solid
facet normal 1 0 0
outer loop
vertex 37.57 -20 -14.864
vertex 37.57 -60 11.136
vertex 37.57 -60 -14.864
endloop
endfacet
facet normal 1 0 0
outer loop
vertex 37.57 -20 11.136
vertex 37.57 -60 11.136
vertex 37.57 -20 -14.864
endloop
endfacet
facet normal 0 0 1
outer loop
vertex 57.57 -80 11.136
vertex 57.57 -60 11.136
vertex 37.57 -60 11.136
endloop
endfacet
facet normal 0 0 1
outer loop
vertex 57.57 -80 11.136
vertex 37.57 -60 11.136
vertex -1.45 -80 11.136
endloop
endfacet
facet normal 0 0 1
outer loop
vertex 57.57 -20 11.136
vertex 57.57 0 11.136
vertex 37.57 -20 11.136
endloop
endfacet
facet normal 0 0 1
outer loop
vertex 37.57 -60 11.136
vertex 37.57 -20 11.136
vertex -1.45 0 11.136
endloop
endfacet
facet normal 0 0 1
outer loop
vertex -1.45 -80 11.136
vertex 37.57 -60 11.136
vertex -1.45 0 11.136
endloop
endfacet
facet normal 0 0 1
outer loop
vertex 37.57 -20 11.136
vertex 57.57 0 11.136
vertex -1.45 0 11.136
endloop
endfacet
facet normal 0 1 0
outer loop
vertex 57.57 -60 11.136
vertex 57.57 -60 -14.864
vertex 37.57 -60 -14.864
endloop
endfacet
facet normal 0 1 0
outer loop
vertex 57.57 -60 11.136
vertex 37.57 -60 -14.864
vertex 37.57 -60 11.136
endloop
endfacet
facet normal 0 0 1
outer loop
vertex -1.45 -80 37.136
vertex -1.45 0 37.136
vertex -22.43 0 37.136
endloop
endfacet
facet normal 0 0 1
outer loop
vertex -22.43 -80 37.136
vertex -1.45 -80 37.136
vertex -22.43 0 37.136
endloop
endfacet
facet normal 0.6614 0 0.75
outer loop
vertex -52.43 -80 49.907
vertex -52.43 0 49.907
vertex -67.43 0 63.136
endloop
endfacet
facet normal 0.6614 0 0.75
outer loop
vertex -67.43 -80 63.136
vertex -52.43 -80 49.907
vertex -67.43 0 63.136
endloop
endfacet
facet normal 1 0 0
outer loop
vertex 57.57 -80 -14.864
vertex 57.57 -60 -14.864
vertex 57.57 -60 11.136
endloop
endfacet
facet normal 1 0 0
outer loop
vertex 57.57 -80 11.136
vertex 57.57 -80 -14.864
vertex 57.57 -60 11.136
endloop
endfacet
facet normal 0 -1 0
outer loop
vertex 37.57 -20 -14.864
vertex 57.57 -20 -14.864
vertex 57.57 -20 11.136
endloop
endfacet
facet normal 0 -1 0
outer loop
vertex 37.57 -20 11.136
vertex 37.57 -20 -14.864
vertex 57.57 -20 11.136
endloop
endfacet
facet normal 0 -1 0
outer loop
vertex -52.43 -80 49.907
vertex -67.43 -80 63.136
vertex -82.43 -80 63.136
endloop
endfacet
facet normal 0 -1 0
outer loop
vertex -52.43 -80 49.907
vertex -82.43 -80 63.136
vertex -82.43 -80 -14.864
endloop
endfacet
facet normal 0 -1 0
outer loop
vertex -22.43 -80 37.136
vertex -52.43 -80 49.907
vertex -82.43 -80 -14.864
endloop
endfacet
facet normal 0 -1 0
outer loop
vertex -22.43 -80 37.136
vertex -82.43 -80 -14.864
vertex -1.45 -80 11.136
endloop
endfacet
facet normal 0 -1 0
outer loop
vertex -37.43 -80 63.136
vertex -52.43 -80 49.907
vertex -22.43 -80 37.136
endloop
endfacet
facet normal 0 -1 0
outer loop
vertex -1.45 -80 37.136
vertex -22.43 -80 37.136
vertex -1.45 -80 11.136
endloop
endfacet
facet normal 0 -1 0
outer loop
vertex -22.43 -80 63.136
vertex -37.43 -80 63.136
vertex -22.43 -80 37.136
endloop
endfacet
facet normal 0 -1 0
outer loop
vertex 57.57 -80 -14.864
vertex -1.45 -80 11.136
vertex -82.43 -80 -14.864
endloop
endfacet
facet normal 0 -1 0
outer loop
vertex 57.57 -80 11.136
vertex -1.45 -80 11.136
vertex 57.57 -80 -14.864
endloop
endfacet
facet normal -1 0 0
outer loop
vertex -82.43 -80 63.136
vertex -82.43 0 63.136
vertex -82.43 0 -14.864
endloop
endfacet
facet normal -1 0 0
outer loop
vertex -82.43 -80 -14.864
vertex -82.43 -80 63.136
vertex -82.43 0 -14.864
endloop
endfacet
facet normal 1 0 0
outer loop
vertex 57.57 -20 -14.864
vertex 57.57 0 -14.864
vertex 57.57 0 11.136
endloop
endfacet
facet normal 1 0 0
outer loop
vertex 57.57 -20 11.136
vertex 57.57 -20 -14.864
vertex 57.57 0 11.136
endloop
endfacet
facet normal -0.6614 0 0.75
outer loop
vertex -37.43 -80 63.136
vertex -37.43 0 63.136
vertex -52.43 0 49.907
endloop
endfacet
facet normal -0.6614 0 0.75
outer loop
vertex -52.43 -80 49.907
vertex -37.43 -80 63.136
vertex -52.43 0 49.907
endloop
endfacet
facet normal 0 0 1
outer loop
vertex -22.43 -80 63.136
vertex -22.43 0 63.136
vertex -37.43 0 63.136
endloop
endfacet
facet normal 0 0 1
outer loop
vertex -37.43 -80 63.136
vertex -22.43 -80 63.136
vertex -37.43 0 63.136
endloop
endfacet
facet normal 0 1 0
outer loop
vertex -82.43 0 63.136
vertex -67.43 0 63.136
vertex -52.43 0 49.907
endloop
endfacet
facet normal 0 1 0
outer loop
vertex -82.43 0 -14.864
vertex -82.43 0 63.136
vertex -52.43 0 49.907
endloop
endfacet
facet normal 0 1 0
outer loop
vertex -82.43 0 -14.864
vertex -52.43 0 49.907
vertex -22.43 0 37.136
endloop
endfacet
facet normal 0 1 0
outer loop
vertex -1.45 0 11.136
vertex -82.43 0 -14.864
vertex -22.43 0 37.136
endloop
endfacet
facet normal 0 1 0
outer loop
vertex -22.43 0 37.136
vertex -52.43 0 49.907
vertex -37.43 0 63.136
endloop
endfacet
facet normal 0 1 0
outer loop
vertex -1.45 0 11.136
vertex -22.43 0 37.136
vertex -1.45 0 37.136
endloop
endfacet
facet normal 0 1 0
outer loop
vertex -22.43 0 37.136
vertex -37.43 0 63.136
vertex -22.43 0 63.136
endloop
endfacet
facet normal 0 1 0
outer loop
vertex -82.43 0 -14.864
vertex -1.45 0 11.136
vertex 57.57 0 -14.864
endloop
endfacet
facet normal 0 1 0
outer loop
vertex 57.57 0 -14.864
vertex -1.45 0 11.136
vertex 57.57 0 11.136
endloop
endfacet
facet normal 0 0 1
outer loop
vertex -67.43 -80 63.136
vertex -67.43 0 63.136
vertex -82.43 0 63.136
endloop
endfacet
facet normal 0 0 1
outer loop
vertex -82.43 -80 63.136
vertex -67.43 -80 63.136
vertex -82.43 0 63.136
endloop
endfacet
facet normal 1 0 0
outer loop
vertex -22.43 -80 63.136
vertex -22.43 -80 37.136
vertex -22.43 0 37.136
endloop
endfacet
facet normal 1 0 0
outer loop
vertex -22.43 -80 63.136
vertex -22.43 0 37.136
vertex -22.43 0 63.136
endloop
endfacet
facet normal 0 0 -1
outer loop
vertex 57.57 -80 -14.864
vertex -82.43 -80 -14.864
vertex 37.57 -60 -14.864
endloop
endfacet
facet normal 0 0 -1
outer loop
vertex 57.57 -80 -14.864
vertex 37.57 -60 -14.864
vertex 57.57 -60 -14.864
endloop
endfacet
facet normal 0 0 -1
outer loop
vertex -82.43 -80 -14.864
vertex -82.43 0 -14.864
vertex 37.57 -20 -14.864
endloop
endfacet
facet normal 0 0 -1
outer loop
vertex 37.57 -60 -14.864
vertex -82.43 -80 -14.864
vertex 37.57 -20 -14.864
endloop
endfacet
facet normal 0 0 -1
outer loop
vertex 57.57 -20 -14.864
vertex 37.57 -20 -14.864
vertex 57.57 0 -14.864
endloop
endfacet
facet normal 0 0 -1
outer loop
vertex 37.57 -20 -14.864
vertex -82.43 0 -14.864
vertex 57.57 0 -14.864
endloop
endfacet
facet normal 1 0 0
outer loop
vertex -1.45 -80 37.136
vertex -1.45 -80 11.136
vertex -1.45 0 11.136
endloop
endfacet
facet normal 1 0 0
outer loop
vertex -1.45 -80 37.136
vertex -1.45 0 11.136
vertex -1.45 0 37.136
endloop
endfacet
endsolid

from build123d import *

# Parameters (mm, degrees)
F1_DEPTH = 80
F2_W     = 40
F2_H     = 26
F3_DEPTH = 20


with BuildPart() as f1:
    # F0 (on Front) → F1 (new body)
    with BuildSketch(Plane.XZ):
        Polygon((-82.429772, -14.864372), (57.570228, -14.864372), (57.570228, 11.135628), (-1.449937, 11.135628), (-1.449937, 37.135628), (-22.429772, 37.135628), (-22.429772, 63.135628), (-37.429772, 63.135628), (-52.429772, 49.906872), (-67.429772, 63.135628), (-82.429772, 63.135628), align=None)
    extrude(amount=F1_DEPTH)

    # F2 (on face) → F3 (cut)
    with BuildSketch(Plane.YZ.offset(57.570228)):
        with Locations((-40, -1.864372)):
            Rectangle(F2_W, F2_H)
    extrude(amount=-F3_DEPTH, mode=Mode.SUBTRACT)


solid = f1.part
